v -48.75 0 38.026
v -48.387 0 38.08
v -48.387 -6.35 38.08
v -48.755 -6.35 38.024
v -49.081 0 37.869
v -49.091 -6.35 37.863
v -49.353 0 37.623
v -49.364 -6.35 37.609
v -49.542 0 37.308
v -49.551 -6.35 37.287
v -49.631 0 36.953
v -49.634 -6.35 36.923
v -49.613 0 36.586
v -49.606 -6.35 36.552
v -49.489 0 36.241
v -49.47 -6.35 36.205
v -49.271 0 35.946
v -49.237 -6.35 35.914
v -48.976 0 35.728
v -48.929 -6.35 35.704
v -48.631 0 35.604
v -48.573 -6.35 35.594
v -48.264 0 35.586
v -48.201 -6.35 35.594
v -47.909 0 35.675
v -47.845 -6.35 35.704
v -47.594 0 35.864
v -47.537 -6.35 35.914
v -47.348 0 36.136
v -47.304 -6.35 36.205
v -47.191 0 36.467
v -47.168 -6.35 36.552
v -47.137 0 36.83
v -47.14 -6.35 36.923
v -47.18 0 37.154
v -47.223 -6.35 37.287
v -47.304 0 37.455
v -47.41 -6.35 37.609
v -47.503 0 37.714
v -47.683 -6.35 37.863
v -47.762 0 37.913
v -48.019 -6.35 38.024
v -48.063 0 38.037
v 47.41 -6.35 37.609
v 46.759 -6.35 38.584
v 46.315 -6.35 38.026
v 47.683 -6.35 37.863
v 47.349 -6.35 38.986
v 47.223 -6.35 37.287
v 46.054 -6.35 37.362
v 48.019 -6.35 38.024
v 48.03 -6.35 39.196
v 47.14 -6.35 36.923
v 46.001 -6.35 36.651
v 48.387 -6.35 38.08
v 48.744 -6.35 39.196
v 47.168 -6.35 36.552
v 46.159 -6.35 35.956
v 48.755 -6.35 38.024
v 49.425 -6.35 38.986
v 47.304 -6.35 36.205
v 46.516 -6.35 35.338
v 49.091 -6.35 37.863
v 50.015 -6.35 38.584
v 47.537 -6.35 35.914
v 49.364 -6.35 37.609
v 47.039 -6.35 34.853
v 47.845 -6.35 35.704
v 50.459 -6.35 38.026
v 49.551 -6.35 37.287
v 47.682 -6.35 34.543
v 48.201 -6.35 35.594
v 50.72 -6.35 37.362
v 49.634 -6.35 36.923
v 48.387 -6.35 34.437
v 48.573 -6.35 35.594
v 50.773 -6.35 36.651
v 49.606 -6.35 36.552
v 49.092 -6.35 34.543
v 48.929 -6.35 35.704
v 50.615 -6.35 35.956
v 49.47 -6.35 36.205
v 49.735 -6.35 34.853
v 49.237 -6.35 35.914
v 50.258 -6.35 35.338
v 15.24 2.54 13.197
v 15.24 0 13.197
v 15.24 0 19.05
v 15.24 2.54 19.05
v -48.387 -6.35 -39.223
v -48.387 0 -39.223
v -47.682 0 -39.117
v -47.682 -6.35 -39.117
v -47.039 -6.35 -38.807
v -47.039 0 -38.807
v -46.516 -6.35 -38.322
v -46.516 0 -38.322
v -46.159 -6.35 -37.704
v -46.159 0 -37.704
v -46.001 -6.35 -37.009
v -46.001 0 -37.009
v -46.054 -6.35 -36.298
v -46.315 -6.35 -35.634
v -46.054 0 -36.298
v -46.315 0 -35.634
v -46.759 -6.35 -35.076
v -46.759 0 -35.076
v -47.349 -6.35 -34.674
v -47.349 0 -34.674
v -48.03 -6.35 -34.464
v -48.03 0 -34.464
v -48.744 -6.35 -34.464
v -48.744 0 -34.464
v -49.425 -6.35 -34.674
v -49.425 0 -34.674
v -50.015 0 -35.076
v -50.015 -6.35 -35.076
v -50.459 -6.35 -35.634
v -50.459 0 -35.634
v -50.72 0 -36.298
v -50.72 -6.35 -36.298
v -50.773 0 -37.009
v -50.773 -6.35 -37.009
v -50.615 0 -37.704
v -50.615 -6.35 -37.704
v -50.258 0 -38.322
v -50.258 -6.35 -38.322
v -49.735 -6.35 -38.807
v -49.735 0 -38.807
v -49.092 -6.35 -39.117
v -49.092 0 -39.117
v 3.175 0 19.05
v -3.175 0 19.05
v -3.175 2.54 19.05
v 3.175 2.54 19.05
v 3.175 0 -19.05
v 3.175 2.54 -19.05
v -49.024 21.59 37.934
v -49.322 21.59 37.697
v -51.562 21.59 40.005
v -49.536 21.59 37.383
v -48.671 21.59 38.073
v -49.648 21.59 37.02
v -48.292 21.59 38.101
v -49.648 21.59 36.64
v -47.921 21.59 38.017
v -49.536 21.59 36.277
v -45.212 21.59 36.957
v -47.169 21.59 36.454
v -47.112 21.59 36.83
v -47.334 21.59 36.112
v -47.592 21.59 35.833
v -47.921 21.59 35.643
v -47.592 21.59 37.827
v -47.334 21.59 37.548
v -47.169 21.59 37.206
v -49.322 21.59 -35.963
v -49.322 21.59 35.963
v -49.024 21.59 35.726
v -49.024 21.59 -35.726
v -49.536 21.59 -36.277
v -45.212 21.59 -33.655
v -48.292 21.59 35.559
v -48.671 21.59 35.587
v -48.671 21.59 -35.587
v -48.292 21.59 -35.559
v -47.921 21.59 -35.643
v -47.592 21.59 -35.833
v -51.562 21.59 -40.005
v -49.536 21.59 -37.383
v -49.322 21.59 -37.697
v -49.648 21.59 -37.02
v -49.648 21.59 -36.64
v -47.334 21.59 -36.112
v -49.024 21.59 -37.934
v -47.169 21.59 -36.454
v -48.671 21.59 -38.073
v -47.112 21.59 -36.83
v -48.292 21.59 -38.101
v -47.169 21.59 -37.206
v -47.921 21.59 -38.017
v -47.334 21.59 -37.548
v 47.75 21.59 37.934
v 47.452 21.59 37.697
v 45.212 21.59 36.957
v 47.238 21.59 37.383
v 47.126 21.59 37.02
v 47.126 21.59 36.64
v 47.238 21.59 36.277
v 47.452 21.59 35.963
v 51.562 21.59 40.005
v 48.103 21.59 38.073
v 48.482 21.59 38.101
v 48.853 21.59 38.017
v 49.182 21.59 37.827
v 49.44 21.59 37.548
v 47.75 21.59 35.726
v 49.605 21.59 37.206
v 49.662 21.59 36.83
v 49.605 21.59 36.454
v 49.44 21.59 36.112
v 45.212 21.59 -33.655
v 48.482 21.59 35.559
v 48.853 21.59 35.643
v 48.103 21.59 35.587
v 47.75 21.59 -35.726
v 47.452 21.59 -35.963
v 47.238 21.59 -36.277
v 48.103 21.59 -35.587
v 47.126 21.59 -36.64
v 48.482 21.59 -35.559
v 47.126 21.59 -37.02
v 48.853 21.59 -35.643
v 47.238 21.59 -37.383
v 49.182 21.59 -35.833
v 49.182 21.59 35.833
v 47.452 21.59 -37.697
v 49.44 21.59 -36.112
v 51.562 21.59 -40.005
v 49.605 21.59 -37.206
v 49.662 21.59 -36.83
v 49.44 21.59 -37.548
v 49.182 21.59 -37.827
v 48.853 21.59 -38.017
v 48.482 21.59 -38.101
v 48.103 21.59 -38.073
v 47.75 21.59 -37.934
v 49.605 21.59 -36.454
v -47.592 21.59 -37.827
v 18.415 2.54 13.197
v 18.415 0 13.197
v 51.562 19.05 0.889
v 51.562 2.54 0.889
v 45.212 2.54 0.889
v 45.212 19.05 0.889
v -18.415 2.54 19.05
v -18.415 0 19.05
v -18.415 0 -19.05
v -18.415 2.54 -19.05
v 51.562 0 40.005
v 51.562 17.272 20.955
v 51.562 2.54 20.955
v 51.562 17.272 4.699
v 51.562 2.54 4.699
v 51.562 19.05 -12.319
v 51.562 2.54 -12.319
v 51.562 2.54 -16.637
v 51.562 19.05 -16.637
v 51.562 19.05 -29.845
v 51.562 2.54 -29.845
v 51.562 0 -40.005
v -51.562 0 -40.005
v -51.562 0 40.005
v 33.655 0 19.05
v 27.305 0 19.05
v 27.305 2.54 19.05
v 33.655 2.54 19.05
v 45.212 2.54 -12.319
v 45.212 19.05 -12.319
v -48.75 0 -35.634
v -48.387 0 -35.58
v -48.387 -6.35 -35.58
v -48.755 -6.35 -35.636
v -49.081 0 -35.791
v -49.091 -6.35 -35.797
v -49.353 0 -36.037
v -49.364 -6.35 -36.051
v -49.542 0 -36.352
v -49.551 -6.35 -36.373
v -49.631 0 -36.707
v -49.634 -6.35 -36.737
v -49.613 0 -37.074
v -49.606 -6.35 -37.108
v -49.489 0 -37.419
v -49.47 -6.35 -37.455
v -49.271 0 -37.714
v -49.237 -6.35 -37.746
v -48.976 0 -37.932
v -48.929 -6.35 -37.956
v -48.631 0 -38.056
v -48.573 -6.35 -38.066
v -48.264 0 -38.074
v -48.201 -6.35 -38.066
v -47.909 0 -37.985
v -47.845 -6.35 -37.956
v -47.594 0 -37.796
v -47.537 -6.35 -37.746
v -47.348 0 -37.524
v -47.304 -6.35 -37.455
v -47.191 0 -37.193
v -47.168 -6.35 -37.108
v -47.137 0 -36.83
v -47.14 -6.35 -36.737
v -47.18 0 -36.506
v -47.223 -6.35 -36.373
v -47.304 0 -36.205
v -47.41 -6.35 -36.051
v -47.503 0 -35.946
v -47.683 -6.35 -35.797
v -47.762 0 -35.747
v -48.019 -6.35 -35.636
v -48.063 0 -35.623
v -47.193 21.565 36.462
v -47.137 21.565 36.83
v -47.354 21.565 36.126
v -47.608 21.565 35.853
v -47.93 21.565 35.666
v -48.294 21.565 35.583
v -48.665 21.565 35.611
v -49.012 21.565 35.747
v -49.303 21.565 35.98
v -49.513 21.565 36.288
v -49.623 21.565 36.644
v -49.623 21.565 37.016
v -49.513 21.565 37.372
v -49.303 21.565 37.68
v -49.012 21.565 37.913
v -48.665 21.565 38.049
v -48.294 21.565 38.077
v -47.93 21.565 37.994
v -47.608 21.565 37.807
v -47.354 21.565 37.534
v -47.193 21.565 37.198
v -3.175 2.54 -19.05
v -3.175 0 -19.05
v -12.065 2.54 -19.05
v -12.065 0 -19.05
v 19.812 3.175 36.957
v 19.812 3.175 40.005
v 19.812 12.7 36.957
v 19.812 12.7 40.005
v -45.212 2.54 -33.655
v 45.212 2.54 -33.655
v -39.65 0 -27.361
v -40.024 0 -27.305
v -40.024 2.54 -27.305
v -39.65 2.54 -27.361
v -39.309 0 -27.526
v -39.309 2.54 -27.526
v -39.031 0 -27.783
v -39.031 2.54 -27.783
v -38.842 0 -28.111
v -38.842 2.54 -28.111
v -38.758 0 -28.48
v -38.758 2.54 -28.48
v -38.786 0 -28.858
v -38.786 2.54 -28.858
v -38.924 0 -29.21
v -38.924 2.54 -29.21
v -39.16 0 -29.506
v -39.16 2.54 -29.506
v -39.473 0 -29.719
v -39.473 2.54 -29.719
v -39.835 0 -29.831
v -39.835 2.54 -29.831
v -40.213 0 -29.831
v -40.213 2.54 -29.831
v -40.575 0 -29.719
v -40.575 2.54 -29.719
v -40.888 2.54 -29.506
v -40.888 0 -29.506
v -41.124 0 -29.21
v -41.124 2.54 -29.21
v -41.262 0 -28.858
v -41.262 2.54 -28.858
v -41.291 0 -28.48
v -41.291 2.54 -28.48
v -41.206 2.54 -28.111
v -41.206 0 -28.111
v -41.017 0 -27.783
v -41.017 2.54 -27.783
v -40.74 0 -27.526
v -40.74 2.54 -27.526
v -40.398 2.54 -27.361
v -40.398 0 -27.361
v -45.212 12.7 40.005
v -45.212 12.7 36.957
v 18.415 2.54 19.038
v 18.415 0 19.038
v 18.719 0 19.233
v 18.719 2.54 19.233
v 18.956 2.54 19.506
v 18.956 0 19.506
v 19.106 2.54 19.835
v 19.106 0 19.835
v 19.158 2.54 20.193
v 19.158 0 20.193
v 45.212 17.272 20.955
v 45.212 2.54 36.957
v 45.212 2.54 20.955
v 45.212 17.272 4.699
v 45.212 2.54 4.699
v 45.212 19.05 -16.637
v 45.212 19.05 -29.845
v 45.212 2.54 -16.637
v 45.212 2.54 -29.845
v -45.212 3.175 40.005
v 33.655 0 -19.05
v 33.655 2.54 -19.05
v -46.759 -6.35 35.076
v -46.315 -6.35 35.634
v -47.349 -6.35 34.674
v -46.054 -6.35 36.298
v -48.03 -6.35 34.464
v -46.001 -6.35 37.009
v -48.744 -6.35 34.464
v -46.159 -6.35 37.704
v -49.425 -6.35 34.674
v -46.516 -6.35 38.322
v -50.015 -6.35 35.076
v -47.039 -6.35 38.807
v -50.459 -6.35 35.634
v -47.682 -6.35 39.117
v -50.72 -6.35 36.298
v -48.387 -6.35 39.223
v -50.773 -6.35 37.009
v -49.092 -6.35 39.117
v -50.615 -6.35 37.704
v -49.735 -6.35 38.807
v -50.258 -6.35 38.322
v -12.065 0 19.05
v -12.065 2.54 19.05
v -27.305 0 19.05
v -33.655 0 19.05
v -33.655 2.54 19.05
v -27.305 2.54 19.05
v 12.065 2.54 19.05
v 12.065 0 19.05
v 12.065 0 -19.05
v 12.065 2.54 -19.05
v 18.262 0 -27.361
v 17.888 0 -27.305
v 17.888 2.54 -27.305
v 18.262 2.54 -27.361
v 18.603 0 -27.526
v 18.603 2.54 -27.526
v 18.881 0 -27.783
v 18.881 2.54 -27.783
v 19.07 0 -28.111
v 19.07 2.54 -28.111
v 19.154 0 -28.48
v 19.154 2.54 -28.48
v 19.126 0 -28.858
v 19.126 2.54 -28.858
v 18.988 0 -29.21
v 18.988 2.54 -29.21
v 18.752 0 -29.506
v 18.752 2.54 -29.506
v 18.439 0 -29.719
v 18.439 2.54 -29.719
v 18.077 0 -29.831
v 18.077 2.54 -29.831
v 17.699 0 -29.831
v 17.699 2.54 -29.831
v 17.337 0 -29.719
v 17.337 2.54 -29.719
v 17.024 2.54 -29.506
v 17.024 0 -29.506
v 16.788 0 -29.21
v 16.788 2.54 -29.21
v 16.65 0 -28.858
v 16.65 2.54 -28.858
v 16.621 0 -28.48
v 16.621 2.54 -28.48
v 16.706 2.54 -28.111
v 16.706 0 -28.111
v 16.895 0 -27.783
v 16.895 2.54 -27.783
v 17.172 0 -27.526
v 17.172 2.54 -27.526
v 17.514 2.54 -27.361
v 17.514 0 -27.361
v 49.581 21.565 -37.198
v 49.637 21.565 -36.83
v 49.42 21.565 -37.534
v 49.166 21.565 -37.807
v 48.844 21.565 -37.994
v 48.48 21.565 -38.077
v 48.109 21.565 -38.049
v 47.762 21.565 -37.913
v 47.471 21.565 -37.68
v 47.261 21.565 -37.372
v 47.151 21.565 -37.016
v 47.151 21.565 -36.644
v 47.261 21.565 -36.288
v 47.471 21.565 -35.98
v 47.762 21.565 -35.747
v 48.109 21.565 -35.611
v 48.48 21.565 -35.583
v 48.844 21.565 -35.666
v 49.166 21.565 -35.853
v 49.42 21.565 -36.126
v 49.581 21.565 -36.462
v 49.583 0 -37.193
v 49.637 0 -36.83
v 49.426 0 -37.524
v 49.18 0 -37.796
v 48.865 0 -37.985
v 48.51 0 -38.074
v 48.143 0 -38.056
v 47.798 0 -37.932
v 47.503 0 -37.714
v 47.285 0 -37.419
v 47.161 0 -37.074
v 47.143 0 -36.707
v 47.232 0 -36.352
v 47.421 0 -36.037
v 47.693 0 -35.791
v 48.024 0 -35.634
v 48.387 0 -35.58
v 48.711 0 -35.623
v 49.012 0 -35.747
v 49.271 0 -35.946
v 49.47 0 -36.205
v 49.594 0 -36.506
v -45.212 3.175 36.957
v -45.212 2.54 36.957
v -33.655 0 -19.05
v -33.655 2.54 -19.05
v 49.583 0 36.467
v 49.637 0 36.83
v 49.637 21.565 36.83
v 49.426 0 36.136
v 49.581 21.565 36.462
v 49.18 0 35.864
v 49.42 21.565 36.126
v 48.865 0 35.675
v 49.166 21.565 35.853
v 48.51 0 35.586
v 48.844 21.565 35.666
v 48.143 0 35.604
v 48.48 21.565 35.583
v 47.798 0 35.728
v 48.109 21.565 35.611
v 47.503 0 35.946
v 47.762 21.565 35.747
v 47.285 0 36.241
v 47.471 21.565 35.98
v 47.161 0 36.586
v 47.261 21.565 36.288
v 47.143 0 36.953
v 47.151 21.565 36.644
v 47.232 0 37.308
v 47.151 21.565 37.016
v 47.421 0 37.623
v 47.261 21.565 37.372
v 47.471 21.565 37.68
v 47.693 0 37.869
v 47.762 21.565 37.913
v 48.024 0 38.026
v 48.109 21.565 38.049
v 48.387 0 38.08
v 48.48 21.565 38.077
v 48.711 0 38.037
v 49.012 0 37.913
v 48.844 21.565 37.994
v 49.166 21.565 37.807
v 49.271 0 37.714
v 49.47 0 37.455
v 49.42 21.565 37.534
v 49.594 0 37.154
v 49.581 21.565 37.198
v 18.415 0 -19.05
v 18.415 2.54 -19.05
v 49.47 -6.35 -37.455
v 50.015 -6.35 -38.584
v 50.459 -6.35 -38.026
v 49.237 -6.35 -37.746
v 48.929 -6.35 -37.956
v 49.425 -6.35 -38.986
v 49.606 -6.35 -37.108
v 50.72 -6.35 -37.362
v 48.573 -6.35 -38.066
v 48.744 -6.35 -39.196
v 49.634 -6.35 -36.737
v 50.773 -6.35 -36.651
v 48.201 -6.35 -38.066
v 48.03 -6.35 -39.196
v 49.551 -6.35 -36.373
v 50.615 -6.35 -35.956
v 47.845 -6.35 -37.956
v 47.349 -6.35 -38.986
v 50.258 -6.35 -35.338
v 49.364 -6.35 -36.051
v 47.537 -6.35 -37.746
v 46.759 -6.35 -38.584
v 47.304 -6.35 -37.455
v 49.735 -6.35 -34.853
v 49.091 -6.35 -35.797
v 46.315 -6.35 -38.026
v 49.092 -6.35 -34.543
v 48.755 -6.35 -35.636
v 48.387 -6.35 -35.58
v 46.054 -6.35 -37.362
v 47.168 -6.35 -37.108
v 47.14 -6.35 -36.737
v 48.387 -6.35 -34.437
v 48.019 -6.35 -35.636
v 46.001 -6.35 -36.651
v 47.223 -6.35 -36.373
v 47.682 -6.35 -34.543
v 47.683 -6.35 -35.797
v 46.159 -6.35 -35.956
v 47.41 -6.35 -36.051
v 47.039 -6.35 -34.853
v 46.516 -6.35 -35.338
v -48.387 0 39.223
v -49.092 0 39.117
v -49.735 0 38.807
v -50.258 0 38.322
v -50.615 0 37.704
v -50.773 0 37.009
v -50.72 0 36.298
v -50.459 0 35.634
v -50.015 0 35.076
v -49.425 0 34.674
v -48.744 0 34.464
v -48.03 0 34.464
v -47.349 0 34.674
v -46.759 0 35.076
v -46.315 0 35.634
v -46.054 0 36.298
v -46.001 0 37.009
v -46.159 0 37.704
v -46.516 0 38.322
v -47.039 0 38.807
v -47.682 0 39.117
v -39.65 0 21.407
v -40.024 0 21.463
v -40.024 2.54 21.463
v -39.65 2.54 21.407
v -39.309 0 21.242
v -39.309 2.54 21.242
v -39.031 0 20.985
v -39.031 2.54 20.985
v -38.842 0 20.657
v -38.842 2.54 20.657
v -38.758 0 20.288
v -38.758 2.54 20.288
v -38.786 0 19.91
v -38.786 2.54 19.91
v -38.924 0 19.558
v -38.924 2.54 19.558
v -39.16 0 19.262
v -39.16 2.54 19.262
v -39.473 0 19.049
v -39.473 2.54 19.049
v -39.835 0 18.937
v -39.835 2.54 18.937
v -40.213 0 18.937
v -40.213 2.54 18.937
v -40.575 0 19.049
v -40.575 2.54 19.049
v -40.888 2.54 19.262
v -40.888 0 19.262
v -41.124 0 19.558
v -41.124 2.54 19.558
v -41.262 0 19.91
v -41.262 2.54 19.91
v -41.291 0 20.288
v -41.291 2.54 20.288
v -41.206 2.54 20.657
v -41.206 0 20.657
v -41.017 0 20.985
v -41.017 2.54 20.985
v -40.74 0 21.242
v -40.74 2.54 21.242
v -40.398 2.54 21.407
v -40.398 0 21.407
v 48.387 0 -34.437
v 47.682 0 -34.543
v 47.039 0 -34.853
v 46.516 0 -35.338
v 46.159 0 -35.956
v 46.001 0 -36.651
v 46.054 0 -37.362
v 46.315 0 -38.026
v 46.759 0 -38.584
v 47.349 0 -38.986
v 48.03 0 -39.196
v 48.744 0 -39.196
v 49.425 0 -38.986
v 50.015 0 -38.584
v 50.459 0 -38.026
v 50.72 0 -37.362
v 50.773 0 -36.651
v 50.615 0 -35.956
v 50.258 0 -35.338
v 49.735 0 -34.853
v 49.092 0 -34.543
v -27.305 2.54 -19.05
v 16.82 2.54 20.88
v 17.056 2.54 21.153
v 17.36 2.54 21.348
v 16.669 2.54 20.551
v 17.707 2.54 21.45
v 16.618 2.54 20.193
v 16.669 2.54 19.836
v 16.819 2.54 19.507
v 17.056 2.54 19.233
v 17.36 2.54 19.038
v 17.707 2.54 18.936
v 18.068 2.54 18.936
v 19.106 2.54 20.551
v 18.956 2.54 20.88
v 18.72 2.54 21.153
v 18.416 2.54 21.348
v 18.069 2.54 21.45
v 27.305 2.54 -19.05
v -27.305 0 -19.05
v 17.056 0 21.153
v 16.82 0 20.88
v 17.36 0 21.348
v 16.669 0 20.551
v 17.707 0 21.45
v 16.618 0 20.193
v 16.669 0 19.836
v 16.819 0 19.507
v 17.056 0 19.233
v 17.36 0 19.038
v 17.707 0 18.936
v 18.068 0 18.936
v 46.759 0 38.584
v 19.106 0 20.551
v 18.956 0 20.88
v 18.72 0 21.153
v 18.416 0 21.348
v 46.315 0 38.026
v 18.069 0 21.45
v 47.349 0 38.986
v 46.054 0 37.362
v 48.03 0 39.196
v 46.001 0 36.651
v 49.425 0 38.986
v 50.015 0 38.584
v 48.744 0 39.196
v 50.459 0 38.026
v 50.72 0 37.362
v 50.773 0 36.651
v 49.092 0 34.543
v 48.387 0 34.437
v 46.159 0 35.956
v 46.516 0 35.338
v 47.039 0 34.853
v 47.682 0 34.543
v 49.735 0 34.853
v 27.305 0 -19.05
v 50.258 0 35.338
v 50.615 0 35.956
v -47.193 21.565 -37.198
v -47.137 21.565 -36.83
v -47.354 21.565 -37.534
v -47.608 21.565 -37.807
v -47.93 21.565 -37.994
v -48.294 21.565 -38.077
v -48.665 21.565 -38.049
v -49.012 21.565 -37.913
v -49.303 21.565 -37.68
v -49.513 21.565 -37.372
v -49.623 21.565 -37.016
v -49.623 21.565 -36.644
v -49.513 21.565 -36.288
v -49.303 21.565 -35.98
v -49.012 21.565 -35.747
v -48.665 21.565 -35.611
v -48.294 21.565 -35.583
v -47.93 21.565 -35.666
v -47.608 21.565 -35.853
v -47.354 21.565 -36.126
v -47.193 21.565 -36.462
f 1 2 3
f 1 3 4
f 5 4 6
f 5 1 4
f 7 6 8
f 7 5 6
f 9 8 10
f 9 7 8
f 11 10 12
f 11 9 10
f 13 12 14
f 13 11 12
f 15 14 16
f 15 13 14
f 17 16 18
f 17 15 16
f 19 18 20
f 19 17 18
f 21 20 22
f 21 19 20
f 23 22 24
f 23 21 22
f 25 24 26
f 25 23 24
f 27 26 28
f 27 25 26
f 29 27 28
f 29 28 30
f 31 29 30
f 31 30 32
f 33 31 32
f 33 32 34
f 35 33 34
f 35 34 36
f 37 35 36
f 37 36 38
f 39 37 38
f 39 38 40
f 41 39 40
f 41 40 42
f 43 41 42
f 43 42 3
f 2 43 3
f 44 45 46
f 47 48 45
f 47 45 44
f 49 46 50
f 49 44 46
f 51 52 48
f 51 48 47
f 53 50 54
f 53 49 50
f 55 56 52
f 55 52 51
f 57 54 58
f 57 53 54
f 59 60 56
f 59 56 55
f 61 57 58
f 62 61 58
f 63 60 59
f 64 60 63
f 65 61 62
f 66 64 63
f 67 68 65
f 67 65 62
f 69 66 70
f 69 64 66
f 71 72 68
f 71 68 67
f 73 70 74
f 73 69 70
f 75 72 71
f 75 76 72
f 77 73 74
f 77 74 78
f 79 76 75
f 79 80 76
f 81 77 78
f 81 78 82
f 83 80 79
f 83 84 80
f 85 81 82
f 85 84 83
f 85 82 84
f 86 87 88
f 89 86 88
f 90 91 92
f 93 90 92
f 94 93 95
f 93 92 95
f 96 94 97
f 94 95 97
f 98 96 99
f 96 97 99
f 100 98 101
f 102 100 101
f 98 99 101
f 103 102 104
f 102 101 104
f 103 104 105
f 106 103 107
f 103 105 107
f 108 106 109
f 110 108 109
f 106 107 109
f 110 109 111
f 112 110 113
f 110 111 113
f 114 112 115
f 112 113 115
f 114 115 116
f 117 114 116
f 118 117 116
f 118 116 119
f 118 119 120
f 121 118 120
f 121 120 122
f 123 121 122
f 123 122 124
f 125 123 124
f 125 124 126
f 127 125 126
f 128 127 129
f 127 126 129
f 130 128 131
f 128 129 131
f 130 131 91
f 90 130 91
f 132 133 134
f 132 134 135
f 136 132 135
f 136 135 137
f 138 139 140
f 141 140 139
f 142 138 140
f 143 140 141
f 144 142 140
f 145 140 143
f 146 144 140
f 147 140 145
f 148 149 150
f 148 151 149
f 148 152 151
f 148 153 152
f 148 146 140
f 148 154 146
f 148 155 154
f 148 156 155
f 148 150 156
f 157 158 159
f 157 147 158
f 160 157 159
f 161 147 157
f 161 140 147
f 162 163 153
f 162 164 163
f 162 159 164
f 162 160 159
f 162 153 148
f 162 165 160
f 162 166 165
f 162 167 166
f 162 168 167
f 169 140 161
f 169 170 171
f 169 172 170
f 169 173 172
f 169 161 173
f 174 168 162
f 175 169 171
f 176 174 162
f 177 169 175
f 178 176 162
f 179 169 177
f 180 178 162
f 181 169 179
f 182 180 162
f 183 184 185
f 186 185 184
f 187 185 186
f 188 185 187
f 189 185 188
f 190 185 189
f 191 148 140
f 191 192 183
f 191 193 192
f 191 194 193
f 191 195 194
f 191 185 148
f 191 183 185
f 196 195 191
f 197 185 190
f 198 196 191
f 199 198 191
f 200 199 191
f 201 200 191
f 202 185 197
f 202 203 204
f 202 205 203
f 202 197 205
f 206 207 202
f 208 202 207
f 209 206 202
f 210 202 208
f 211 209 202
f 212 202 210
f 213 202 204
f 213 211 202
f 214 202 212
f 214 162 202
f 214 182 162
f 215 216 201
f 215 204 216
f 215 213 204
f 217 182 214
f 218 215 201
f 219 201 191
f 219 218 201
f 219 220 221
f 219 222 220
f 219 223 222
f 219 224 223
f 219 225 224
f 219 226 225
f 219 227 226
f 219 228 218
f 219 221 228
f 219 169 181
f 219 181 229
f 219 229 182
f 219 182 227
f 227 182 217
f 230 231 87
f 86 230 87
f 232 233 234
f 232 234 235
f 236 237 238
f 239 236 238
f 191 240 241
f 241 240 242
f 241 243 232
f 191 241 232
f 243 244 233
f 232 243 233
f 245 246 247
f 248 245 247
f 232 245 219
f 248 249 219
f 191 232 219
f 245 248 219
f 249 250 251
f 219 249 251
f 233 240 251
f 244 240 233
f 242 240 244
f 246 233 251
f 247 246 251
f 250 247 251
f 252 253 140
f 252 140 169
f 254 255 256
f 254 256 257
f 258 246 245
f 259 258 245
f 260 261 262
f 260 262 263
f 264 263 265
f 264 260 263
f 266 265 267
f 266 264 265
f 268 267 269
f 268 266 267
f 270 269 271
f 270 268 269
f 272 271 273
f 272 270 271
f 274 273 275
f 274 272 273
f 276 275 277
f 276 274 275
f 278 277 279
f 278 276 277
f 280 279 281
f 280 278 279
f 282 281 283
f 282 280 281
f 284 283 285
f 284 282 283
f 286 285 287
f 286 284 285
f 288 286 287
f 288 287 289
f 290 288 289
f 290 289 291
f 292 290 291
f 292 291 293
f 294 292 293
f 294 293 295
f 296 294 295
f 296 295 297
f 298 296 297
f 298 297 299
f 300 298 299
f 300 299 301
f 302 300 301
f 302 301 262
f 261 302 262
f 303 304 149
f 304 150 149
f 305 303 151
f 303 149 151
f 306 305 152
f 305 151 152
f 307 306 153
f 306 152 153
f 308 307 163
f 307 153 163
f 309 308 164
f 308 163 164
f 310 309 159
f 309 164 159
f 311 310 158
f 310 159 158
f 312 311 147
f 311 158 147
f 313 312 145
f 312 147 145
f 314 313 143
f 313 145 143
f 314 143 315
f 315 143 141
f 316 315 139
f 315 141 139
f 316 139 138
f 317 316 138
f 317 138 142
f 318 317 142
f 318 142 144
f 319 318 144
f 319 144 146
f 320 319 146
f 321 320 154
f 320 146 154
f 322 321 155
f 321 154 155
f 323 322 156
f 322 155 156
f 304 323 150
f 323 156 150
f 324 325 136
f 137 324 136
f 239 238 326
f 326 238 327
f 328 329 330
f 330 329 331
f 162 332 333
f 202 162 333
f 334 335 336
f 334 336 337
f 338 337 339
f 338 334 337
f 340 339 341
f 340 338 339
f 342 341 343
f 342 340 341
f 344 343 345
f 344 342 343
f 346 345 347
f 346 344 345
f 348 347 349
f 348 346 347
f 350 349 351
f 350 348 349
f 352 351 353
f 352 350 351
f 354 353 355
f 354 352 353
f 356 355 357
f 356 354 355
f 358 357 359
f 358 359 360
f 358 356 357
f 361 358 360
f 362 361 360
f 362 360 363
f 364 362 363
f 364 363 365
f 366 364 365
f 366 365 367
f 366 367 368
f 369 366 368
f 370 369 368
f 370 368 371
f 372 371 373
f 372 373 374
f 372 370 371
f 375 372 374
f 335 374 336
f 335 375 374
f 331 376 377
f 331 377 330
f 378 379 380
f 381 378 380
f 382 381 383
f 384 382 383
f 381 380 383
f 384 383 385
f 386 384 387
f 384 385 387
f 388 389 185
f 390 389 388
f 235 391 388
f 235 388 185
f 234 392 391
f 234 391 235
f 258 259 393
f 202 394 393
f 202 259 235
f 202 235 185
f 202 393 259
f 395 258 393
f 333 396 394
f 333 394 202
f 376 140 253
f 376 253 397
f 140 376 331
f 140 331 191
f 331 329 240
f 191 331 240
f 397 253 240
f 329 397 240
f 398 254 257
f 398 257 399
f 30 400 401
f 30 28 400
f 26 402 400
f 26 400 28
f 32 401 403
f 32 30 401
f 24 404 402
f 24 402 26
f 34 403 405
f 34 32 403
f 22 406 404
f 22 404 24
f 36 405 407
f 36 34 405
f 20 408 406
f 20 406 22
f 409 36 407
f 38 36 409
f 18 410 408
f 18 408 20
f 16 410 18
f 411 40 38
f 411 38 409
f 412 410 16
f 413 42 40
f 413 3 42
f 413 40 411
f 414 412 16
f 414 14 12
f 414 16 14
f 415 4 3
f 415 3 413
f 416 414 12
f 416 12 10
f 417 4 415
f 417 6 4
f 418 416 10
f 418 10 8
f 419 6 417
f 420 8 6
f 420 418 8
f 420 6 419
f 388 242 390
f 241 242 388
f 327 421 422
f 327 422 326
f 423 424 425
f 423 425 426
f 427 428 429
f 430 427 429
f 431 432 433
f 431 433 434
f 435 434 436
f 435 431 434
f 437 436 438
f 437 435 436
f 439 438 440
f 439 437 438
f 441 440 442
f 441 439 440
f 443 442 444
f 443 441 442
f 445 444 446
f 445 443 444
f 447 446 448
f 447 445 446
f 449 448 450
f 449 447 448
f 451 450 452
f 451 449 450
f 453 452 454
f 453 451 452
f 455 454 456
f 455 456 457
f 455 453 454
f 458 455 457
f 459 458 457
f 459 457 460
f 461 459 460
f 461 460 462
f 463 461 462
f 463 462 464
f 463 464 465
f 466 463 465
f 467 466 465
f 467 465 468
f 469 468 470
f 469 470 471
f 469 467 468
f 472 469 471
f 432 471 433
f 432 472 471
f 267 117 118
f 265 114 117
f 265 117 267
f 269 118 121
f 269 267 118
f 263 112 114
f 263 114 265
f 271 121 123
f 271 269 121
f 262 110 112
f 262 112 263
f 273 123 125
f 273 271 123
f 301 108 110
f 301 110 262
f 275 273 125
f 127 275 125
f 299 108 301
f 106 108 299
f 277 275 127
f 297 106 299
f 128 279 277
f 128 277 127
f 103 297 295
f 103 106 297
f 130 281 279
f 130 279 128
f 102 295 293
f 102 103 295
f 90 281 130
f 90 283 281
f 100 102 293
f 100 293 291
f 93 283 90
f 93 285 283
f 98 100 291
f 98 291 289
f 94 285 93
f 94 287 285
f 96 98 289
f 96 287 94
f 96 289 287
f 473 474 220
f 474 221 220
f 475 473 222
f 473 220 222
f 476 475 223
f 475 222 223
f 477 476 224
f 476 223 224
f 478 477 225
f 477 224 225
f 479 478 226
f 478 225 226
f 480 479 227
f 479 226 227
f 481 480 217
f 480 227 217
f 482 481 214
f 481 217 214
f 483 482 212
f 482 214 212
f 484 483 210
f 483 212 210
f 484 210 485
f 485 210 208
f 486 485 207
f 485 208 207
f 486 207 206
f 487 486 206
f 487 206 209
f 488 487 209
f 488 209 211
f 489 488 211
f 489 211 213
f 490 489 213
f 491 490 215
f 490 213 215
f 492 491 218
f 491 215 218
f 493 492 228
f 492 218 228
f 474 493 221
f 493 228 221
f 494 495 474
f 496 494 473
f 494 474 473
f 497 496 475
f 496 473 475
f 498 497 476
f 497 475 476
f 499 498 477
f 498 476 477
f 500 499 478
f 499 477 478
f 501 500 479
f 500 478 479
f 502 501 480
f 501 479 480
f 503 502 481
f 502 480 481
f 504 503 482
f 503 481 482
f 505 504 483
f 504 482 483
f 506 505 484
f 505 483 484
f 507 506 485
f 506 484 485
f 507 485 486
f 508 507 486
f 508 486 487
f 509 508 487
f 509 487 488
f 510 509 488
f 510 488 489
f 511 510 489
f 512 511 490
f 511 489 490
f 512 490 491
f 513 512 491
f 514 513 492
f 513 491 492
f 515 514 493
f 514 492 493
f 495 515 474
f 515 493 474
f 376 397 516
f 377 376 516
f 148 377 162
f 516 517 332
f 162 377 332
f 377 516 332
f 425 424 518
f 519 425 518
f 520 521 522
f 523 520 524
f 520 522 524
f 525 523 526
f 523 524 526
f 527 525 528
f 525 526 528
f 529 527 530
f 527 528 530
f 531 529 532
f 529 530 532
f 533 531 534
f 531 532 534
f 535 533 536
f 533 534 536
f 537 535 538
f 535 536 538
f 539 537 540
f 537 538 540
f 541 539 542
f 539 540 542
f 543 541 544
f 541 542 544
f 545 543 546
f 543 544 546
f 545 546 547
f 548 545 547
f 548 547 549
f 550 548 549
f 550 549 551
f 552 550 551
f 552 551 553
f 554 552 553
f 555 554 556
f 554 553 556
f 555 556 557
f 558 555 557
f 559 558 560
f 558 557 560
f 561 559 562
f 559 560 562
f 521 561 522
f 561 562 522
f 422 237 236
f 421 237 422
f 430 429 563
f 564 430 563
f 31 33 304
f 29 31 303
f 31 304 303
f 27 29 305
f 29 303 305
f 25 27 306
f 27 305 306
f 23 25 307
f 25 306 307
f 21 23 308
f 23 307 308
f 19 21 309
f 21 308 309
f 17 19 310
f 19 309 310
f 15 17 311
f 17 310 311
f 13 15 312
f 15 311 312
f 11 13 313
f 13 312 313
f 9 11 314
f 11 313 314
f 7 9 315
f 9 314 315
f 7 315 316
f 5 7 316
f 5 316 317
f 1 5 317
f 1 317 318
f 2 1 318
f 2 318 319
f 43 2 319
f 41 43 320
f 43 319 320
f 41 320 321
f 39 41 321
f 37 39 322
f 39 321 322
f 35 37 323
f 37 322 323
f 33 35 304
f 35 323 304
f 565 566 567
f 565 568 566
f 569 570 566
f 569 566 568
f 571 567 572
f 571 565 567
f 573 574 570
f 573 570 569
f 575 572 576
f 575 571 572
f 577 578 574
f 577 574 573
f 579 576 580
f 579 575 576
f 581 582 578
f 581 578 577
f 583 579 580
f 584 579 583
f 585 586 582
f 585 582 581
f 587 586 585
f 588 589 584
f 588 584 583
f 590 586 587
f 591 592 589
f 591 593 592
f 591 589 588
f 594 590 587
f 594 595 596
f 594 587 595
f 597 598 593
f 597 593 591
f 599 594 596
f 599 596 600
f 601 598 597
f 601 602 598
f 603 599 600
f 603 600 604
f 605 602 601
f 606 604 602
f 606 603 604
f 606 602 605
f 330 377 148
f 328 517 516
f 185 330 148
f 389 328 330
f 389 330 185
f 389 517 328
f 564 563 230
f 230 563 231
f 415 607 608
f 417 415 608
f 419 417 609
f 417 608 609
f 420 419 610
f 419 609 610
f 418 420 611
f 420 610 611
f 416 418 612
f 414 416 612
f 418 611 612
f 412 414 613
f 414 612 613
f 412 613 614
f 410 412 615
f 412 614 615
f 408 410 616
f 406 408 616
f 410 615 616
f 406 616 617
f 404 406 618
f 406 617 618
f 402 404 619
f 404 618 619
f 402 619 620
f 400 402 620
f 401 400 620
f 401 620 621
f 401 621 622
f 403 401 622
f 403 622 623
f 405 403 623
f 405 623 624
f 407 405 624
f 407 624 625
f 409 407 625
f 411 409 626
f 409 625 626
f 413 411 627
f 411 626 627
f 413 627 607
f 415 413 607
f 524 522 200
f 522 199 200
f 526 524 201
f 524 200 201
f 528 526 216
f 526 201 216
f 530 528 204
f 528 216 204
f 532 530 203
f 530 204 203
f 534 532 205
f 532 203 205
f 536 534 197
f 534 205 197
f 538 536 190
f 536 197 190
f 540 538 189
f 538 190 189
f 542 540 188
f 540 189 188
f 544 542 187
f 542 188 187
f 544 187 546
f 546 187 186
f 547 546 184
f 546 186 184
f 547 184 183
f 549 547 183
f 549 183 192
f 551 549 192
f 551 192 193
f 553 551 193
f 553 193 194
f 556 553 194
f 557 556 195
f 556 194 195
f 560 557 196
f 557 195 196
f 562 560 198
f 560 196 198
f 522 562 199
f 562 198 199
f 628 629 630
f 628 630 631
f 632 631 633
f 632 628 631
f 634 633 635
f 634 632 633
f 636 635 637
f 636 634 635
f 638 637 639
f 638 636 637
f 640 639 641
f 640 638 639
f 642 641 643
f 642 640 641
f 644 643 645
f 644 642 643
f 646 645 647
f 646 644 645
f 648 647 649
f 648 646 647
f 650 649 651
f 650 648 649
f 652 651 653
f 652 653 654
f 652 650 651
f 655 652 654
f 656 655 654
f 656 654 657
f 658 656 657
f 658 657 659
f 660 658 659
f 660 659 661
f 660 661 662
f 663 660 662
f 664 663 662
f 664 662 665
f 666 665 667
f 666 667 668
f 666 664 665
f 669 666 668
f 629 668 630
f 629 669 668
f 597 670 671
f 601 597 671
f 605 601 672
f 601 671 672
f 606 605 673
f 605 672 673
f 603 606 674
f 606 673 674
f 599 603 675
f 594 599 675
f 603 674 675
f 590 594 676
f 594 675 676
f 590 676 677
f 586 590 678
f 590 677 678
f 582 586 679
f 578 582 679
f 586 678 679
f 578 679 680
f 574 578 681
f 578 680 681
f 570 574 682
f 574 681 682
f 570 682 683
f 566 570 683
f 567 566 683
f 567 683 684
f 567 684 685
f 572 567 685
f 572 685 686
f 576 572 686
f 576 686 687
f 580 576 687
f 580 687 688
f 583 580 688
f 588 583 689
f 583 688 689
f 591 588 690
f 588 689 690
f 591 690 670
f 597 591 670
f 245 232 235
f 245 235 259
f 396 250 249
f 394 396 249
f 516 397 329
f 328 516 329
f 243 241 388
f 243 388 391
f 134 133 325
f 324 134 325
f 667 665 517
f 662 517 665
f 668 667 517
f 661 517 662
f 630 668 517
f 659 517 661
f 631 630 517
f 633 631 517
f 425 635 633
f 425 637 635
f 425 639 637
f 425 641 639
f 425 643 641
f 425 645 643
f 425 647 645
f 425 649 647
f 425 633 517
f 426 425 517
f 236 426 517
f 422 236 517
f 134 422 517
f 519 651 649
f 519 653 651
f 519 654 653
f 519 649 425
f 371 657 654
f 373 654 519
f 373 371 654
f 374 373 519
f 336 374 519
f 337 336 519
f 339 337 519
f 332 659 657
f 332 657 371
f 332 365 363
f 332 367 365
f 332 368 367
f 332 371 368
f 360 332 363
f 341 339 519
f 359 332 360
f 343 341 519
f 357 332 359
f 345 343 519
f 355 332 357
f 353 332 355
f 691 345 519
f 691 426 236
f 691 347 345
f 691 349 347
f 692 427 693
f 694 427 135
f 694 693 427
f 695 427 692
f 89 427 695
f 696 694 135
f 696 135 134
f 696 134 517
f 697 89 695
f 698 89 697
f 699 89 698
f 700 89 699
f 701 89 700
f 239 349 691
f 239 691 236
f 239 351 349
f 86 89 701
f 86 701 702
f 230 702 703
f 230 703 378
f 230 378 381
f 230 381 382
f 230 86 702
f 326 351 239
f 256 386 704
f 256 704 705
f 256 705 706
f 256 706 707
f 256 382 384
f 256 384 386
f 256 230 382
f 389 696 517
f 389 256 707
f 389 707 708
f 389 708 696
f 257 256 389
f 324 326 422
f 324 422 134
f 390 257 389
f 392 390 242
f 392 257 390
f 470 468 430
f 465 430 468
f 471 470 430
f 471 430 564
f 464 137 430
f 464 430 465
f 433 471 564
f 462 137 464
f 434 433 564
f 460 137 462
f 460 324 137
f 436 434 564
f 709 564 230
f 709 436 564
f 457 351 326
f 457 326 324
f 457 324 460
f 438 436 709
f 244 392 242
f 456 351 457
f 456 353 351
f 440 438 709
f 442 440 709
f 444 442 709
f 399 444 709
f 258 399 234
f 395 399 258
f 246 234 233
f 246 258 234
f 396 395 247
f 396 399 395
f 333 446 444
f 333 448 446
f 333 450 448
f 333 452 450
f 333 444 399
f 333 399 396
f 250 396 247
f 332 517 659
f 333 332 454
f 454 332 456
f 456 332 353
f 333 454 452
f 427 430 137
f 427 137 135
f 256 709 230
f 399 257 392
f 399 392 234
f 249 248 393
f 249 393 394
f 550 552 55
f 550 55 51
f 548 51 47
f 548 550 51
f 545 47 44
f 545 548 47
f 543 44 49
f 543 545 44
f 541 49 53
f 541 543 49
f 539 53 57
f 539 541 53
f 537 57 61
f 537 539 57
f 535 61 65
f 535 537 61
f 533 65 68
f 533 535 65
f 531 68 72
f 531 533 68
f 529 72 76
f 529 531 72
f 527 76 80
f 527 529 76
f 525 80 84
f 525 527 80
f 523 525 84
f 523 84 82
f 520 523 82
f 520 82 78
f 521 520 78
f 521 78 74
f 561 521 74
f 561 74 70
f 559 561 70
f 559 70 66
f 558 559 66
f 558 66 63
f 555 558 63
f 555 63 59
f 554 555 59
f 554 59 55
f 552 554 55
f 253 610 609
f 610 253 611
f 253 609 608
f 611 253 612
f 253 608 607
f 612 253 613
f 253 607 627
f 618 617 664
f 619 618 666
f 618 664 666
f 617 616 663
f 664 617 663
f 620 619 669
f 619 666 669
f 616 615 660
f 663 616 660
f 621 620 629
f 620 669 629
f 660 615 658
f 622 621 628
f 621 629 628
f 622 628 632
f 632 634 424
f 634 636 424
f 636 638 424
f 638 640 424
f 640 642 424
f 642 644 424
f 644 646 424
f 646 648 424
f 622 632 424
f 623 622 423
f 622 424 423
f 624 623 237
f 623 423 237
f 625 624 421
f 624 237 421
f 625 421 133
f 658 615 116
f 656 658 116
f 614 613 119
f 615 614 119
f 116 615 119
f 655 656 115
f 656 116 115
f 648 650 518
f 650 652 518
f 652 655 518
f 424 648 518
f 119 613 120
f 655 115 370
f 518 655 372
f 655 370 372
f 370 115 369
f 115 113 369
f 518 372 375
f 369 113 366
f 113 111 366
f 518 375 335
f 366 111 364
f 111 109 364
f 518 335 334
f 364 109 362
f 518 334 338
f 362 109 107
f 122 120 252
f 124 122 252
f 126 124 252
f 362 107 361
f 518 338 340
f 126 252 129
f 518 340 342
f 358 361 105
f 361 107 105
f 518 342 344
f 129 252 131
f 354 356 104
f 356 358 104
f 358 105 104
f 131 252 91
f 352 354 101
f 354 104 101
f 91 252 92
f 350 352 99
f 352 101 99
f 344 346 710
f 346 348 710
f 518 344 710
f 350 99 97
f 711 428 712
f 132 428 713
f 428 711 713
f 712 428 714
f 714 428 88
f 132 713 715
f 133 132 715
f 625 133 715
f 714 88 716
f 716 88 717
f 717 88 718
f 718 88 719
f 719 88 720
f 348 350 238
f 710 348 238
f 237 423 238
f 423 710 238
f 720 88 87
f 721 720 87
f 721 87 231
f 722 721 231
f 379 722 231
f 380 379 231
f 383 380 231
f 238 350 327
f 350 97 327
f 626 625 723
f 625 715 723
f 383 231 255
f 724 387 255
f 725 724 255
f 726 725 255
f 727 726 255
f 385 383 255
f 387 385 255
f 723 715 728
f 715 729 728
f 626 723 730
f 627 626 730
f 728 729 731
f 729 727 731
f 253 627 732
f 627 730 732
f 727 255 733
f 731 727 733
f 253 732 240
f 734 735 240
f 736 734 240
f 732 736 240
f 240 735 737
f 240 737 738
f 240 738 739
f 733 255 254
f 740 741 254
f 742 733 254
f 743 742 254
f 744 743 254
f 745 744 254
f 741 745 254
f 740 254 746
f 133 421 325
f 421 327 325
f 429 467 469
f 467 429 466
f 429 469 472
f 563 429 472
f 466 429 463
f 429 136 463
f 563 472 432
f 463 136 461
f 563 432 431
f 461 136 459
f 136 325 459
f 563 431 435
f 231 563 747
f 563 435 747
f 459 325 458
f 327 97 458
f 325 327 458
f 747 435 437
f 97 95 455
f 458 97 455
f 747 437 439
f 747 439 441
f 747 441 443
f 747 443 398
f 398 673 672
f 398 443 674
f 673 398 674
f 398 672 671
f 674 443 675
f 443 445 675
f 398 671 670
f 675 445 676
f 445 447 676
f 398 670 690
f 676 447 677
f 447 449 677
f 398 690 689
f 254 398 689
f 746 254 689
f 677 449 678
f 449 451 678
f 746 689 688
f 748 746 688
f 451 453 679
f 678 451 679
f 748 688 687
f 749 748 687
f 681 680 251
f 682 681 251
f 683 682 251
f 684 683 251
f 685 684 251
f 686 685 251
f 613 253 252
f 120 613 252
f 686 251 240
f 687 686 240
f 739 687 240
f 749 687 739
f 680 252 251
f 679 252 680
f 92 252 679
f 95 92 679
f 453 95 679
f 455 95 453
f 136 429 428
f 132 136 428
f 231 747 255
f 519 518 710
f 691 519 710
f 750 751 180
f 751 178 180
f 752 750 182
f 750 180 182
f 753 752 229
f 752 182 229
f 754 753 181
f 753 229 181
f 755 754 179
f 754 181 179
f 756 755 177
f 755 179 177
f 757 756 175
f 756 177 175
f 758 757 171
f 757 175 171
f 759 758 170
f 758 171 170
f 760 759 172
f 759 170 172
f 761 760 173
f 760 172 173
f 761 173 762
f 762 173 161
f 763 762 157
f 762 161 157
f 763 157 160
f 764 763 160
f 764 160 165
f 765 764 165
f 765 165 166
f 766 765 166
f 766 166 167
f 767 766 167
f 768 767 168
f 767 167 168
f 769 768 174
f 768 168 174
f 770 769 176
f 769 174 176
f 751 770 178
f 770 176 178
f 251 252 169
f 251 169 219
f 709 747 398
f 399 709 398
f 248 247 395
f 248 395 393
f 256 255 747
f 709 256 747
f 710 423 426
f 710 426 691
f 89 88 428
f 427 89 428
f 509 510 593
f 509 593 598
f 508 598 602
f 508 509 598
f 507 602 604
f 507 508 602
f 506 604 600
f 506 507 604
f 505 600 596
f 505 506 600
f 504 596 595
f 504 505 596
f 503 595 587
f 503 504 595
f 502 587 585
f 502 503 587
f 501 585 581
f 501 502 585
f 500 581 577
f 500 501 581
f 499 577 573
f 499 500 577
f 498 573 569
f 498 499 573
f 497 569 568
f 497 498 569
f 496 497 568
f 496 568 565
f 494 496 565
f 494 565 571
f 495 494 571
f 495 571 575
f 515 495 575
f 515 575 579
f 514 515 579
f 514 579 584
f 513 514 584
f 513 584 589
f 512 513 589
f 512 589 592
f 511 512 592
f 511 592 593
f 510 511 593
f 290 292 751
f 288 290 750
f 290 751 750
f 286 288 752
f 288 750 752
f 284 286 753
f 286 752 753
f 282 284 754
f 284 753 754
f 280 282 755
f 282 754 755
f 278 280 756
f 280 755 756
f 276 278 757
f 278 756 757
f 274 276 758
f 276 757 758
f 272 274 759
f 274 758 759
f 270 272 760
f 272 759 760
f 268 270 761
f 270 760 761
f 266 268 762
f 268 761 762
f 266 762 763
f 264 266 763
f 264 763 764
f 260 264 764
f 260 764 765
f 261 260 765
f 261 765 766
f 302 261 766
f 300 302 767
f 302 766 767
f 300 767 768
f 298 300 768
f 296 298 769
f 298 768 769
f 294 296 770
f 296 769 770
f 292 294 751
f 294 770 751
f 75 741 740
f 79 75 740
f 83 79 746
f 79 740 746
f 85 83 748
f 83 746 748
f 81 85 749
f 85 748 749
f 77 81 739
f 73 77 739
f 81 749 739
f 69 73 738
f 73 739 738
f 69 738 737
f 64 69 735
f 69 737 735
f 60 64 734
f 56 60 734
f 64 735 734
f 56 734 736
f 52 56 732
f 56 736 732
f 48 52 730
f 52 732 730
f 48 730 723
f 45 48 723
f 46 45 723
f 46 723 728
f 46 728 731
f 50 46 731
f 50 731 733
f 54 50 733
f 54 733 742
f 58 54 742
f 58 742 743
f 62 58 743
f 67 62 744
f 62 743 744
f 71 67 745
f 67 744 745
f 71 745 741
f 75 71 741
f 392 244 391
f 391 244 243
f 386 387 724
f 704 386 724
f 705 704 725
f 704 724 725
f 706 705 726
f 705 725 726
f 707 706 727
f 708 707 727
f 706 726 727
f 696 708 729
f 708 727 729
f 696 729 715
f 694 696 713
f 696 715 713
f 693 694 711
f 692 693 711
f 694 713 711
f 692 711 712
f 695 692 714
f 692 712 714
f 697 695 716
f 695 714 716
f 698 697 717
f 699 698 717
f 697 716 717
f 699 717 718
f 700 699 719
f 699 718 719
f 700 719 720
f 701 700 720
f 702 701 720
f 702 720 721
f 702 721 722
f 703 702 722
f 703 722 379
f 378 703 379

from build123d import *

# Parameters (mm, degrees)
SKETCH1_W           = 103.124
SKETCH1_H           = 80.01
SKETCH1_W_2         = 90.424
SKETCH1_H_2         = 70.612
BOSS_EXTRUDE3_DEPTH = 21.59
SKETCH1_4_W         = 90.424
SKETCH1_4_H         = 70.612
SKETCH1_4_R         = 1.27
SKETCH1_4_W_2       = 6.35
SKETCH1_4_H_2       = 38.1
BOSS_EXTRUDE4_DEPTH = 2.54
SKETCH2_W           = 16.256
SKETCH2_H           = 14.732
SKETCH2_W_2         = 13.208
SKETCH2_H_2         = 16.51
CUT_EXTRUDE1_DEPTH  = 6.35
SKETCH6_W           = 65.024
SKETCH6_H           = 9.525
CUT_EXTRUDE2_DEPTH  = 3.048
SKETCH8_R           = 2.393
SKETCH8_R_2         = 1.25
BOSS_EXTRUDE5_DEPTH = 6.35


# Read off the part's stored shape, not the designer's step: Ø2.5mm Dowel Hole1
with BuildPart() as part:
    # Sketch1 → Boss-Extrude3 (new body)
    with BuildSketch(Plane(origin=(0, 0, 0), x_dir=(1, 0, 0), z_dir=(0, 1, 0))):
        Rectangle(SKETCH1_W, SKETCH1_H)
        with Locations((0, -1.651)):
            Rectangle(SKETCH1_W_2, SKETCH1_H_2, mode=Mode.SUBTRACT)
    extrude(amount=BOSS_EXTRUDE3_DEPTH)

    # Sketch1<4> → Boss-Extrude4 (add)
    with BuildSketch(Plane(origin=(0, 0, 0), x_dir=(1, 0, 0), z_dir=(0, 1, 0))):
        with Locations((0, -1.651)):
            Rectangle(SKETCH1_4_W, SKETCH1_4_H)
        with Locations(Location((-40.024126951, -20.193, 0), (0, 0, 270))):
            Circle(SKETCH1_4_R, mode=Mode.SUBTRACT)
        with Locations((-30.48, 0)):
            Rectangle(SKETCH1_4_W_2, SKETCH1_4_H_2, mode=Mode.SUBTRACT)
        with Locations((-15.24, 0)):
            Rectangle(SKETCH1_4_W_2, SKETCH1_4_H_2, mode=Mode.SUBTRACT)
        Rectangle(SKETCH1_4_W_2, SKETCH1_4_H_2, mode=Mode.SUBTRACT)
        with BuildLine():
            ThreePointArc((18.415, -19.037561911), (18.956131264, -19.506178054), (19.157873049, -20.193))
            ThreePointArc((19.157873049, -20.193), (16.819614834, -20.879821946), (18.415, -19.037561911))
        make_face(mode=Mode.SUBTRACT)
        Polygon((12.065, -19.05), (12.065, 19.05), (18.415, 19.05), (18.415, -13.196681286), (15.24, -13.196681286), (15.24, -19.05), align=None, mode=Mode.SUBTRACT)
        with Locations((30.48, 0)):
            Rectangle(SKETCH1_4_W_2, SKETCH1_4_H_2, mode=Mode.SUBTRACT)
        with Locations(Location((-40.024126951, 28.575, 0), (0, 0, 270))):
            Circle(SKETCH1_4_R, mode=Mode.SUBTRACT)
        with Locations(Location((17.887873049, 28.575, 0), (0, 0, 270))):
            Circle(SKETCH1_4_R, mode=Mode.SUBTRACT)
    extrude(amount=BOSS_EXTRUDE4_DEPTH)

    # Sketch2 → Cut-Extrude1 (cut)
    with BuildSketch(Plane(origin=(51.562, 0, 0), x_dir=(0, 0, -1), z_dir=(1, 0, 0))):
        with Locations((-12.827, 9.906)):
            Rectangle(SKETCH2_W, SKETCH2_H)
        with Locations((5.715, 10.795)):
            Rectangle(SKETCH2_W_2, SKETCH2_H_2)
        with Locations((23.241, 10.795)):
            Rectangle(SKETCH2_W_2, SKETCH2_H_2)
    extrude(amount=-CUT_EXTRUDE1_DEPTH, mode=Mode.SUBTRACT)

    # Ø2.5mm Dowel Hole1 outline → Ø2.5mm Dowel Hole1 (revolve, cut)
    with BuildSketch(Plane(origin=(48.387, 0, -36.83), x_dir=(1, 0, 0), z_dir=(0, 0, 1))):
        Polygon((0, 0), (1.25, 0), (1.25, 21.565), (1.275, 21.59), (0, 21.59), align=None)
    revolve(axis=Axis((48.387, 0, -36.83), (0, 1, 0)), mode=Mode.SUBTRACT)

    # 2.5mm Dowel Hole1 2 outline → 2.5mm Dowel Hole1 2 (revolve, cut)
    with BuildSketch(Plane(origin=(48.387, 0, 36.83), x_dir=(1, 0, 0), z_dir=(0, 0, 1))):
        Polygon((0, 0), (1.25, 0), (1.25, 21.565), (1.275, 21.59), (0, 21.59), align=None)
    revolve(axis=Axis((48.387, 0, 36.83), (0, 1, 0)), mode=Mode.SUBTRACT)

    # 2.5mm Dowel Hole1 3 outline → 2.5mm Dowel Hole1 3 (revolve, cut)
    with BuildSketch(Plane(origin=(-48.387, 0, -36.83), x_dir=(1, 0, 0), z_dir=(0, 0, 1))):
        Polygon((0, 0), (1.25, 0), (1.25, 21.565), (1.275, 21.59), (0, 21.59), align=None)
    revolve(axis=Axis((-48.387, 0, -36.83), (0, 1, 0)), mode=Mode.SUBTRACT)

    # 2.5mm Dowel Hole1 4 outline → 2.5mm Dowel Hole1 4 (revolve, cut)
    with BuildSketch(Plane(origin=(-48.387, 0, 36.83), x_dir=(1, 0, 0), z_dir=(0, 0, 1))):
        Polygon((0, 0), (1.25, 0), (1.25, 21.565), (1.275, 21.59), (0, 21.59), align=None)
    revolve(axis=Axis((-48.387, 0, 36.83), (0, 1, 0)), mode=Mode.SUBTRACT)

    # Sketch6 → Cut-Extrude2 (cut)
    with BuildSketch(Plane.XY.offset(40.005)):
        with Locations((-12.7, 7.9375)):
            Rectangle(SKETCH6_W, SKETCH6_H)
    extrude(amount=-CUT_EXTRUDE2_DEPTH, mode=Mode.SUBTRACT)

    # Sketch8 → Boss-Extrude5 (add)
    # profile 1 of 4: a face of its own
    with BuildSketch(Plane.XZ):
        with Locations(Location((-48.387, 36.83, 0), (0, 0, 90))):
            Circle(SKETCH8_R)
        with Locations(Location((-48.387, 36.83, 0), (0, 0, 90))):
            Circle(SKETCH8_R_2, mode=Mode.SUBTRACT)
    # profile 2 of 4: a face of its own
    with BuildSketch(Plane.XZ):
        with Locations(Location((48.387, 36.83, 0), (0, 0, 270))):
            Circle(SKETCH8_R)
        with Locations(Location((48.387, 36.83, 0), (0, 0, 90))):
            Circle(SKETCH8_R_2, mode=Mode.SUBTRACT)
    # profile 3 of 4: a face of its own
    with BuildSketch(Plane.XZ):
        with Locations(Location((48.387, -36.83, 0), (0, 0, 90))):
            Circle(SKETCH8_R)
        with Locations(Location((48.387, -36.83, 0), (0, 0, 90))):
            Circle(SKETCH8_R_2, mode=Mode.SUBTRACT)
    # profile 4 of 4: a face of its own
    with BuildSketch(Plane.XZ):
        with Locations(Location((-48.387, -36.83, 0), (0, 0, 270))):
            Circle(SKETCH8_R)
        with Locations(Location((-48.387, -36.83, 0), (0, 0, 90))):
            Circle(SKETCH8_R_2, mode=Mode.SUBTRACT)
    extrude(amount=BOSS_EXTRUDE5_DEPTH)


solid = part.part
